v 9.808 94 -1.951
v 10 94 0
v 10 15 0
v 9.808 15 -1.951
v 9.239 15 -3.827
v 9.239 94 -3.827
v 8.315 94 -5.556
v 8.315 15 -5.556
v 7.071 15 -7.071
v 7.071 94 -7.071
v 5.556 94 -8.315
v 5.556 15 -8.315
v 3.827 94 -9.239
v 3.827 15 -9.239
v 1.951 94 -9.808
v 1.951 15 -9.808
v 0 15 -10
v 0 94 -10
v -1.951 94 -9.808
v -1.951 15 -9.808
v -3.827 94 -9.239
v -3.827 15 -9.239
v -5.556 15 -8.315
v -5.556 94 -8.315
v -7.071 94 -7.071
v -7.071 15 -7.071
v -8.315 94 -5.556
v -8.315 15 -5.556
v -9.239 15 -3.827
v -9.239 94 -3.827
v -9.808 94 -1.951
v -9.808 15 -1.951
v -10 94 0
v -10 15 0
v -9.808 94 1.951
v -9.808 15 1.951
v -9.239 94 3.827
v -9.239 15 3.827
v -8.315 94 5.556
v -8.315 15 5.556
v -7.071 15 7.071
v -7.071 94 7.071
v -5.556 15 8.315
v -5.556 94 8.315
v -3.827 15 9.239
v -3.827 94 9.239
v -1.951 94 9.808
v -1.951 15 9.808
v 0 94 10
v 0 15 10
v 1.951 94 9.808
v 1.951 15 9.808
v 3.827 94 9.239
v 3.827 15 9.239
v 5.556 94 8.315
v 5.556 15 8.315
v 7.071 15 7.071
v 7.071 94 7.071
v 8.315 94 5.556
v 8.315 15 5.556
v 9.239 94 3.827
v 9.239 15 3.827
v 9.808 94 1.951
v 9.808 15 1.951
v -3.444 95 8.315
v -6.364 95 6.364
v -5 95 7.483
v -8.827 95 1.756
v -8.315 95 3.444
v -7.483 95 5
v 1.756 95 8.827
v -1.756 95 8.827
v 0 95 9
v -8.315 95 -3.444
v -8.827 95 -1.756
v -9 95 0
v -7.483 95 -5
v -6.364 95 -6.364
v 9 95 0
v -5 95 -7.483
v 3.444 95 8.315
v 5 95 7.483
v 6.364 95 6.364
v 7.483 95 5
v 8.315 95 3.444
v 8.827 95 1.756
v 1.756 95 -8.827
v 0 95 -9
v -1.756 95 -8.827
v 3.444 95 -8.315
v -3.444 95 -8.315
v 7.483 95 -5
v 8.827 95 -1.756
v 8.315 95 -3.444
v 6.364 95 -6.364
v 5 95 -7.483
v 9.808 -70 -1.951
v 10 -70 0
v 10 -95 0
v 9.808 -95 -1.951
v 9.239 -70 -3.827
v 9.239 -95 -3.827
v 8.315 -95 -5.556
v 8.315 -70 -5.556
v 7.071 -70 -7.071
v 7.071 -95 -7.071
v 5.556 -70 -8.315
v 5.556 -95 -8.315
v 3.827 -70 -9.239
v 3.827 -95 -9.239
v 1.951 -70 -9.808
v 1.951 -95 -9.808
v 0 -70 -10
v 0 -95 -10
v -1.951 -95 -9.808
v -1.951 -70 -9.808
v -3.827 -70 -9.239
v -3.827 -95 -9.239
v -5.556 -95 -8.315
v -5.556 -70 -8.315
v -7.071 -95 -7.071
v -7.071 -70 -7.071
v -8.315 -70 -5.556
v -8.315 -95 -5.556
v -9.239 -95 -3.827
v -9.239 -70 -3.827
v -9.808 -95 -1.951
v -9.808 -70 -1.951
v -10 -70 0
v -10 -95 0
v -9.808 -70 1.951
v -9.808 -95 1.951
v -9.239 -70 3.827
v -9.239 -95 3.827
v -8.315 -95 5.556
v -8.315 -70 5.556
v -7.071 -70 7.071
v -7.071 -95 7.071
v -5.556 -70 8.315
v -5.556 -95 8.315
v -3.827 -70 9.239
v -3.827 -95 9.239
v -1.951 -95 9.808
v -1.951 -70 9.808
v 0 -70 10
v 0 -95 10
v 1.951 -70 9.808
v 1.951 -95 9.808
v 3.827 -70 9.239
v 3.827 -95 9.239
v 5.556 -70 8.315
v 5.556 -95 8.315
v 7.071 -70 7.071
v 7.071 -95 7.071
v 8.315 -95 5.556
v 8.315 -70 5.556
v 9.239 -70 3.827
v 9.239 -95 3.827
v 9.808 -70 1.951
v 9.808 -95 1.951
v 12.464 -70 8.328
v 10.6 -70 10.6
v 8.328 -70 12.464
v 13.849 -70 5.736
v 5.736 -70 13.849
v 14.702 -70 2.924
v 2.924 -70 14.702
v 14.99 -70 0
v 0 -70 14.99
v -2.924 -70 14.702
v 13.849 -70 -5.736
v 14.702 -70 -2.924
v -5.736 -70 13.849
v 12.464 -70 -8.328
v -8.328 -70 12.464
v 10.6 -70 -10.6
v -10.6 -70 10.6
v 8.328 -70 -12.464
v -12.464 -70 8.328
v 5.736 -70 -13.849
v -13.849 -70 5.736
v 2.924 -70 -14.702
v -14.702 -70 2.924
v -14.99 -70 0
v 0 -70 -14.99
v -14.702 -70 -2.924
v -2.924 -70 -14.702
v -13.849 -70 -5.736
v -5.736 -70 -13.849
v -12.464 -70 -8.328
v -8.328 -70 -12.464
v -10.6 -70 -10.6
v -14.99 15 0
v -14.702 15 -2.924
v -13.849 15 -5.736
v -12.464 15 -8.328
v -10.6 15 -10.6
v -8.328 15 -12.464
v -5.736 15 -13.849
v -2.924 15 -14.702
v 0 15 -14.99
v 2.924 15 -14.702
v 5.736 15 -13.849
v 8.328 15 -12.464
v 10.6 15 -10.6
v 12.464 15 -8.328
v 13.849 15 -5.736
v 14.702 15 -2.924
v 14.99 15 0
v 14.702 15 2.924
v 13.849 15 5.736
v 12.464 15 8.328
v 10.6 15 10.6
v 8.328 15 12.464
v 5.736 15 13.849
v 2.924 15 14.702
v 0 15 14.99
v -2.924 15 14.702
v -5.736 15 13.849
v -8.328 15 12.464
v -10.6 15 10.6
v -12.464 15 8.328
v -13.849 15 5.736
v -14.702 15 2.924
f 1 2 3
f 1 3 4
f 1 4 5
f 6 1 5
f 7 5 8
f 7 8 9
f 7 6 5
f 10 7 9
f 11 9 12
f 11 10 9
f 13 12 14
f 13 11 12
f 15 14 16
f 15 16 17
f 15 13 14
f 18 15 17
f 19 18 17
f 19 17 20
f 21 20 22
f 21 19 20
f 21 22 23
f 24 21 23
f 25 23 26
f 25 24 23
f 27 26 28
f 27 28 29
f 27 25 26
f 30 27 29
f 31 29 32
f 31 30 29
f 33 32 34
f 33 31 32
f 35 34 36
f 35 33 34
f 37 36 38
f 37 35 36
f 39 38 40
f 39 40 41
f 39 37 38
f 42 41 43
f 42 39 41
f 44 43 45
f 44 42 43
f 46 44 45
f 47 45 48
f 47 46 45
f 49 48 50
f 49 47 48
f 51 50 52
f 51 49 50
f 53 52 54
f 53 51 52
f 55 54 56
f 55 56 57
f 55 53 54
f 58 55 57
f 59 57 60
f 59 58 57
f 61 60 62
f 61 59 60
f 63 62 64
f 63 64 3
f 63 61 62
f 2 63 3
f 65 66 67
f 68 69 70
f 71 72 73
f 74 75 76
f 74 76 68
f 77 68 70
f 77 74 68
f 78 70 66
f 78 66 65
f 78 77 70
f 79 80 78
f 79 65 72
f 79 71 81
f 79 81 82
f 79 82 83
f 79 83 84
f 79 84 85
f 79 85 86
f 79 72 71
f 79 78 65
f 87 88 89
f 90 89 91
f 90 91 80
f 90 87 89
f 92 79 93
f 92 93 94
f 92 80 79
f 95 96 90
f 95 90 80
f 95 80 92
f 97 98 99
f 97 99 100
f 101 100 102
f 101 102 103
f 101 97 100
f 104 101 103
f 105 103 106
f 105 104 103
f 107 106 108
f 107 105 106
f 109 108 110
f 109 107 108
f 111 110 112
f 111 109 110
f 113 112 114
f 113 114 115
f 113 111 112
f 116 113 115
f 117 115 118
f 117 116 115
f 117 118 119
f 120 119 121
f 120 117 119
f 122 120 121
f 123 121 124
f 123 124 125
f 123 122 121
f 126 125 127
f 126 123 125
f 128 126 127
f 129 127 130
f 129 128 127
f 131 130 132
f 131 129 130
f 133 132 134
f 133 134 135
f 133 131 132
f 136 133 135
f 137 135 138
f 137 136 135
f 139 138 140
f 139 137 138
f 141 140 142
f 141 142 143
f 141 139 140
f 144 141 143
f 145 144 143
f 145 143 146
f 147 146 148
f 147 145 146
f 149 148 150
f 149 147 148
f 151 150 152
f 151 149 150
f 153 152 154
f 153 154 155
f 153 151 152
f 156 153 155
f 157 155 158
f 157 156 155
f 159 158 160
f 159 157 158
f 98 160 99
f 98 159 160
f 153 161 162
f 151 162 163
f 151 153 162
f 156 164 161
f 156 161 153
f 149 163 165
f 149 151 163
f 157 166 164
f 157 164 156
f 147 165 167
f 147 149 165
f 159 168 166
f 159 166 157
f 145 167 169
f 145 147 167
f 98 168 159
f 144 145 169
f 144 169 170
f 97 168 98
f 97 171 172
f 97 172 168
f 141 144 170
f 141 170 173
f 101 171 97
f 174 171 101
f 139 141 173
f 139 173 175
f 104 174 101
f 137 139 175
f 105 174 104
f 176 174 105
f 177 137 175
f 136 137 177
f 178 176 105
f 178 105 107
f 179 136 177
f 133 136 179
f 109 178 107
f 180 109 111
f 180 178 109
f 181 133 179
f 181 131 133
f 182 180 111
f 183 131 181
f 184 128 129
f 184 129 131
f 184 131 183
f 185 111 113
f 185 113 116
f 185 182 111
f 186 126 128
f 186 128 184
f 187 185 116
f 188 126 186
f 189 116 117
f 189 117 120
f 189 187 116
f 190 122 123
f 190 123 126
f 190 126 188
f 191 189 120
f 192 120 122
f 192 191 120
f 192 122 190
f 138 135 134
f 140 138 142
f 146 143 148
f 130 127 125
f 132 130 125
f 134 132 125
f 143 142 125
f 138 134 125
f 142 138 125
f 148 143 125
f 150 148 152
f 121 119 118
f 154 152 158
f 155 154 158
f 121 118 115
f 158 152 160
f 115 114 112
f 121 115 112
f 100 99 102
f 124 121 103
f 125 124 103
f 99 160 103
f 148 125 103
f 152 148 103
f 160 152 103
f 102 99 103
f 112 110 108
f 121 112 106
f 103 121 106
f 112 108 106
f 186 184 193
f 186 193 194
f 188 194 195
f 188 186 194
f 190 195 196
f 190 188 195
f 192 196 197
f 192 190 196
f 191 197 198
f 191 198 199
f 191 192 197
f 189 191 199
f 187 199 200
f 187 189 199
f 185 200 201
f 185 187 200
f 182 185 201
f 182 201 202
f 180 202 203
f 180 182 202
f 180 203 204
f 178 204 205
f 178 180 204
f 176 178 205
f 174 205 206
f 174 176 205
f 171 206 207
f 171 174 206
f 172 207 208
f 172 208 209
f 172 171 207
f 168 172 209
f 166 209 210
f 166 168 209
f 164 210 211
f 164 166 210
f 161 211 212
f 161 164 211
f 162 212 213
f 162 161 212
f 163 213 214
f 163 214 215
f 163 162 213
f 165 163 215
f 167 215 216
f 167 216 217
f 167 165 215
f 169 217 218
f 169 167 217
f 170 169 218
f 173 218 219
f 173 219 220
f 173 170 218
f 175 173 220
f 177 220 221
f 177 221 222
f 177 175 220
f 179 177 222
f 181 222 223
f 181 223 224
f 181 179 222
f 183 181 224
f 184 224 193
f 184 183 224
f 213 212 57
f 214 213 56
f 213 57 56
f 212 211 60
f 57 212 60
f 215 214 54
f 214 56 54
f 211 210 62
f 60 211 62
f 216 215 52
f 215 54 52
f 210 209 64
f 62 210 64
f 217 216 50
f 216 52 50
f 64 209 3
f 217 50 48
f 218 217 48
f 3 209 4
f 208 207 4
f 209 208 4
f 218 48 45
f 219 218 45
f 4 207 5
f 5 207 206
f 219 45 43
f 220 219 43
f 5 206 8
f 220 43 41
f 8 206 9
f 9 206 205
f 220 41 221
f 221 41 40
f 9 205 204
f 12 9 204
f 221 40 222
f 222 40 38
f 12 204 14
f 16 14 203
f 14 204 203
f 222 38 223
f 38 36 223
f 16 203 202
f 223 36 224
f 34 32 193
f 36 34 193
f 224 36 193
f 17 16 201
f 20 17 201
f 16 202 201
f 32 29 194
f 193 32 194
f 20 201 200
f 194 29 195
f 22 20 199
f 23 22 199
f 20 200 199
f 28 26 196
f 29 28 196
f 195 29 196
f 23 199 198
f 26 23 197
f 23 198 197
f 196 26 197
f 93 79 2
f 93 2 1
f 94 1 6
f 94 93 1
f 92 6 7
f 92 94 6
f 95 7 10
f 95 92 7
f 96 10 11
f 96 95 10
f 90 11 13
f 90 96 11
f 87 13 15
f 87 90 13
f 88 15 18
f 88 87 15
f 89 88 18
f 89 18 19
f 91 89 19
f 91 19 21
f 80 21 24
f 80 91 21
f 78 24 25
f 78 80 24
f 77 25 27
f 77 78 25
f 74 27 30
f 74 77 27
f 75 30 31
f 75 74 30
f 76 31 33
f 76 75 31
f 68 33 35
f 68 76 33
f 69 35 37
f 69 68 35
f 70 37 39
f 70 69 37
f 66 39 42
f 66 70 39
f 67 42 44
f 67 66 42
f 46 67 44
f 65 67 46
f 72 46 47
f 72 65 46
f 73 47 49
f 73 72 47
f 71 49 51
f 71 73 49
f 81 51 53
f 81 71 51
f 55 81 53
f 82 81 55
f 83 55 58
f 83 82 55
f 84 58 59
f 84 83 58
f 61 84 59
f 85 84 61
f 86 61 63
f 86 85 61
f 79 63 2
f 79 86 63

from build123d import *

# Parameters (mm, degrees)
SKETCH1_R           = 10
BOSS_EXTRUDE1_DEPTH = 95
SKETCH3_R           = 14.99
BOSS_EXTRUDE2_DEPTH = 85
CHAMFER1_SIZE       = 1


with BuildPart() as part:
    # Sketch1 → Boss-Extrude1 (new body, symmetric)
    with BuildSketch(Plane(origin=(0, 0, 0), x_dir=(1, 0, 0), z_dir=(0, 1, 0))):
        Circle(SKETCH1_R)
    extrude(amount=BOSS_EXTRUDE1_DEPTH, both=True)

    # Sketch3 → Boss-Extrude2 (add)
    with BuildSketch(Plane(origin=(0, -70, 0), x_dir=(-1, 0, 0), z_dir=(0, -1, 0))):
        Circle(SKETCH3_R)
    extrude(amount=-BOSS_EXTRUDE2_DEPTH)

    # Chamfer1
    chamfer1_edges = [part.edges().sort_by_distance(p)[0] for p in [
        (-10, 95, 0),
    ]]
    chamfer(chamfer1_edges, length=CHAMFER1_SIZE)


solid = part.part
